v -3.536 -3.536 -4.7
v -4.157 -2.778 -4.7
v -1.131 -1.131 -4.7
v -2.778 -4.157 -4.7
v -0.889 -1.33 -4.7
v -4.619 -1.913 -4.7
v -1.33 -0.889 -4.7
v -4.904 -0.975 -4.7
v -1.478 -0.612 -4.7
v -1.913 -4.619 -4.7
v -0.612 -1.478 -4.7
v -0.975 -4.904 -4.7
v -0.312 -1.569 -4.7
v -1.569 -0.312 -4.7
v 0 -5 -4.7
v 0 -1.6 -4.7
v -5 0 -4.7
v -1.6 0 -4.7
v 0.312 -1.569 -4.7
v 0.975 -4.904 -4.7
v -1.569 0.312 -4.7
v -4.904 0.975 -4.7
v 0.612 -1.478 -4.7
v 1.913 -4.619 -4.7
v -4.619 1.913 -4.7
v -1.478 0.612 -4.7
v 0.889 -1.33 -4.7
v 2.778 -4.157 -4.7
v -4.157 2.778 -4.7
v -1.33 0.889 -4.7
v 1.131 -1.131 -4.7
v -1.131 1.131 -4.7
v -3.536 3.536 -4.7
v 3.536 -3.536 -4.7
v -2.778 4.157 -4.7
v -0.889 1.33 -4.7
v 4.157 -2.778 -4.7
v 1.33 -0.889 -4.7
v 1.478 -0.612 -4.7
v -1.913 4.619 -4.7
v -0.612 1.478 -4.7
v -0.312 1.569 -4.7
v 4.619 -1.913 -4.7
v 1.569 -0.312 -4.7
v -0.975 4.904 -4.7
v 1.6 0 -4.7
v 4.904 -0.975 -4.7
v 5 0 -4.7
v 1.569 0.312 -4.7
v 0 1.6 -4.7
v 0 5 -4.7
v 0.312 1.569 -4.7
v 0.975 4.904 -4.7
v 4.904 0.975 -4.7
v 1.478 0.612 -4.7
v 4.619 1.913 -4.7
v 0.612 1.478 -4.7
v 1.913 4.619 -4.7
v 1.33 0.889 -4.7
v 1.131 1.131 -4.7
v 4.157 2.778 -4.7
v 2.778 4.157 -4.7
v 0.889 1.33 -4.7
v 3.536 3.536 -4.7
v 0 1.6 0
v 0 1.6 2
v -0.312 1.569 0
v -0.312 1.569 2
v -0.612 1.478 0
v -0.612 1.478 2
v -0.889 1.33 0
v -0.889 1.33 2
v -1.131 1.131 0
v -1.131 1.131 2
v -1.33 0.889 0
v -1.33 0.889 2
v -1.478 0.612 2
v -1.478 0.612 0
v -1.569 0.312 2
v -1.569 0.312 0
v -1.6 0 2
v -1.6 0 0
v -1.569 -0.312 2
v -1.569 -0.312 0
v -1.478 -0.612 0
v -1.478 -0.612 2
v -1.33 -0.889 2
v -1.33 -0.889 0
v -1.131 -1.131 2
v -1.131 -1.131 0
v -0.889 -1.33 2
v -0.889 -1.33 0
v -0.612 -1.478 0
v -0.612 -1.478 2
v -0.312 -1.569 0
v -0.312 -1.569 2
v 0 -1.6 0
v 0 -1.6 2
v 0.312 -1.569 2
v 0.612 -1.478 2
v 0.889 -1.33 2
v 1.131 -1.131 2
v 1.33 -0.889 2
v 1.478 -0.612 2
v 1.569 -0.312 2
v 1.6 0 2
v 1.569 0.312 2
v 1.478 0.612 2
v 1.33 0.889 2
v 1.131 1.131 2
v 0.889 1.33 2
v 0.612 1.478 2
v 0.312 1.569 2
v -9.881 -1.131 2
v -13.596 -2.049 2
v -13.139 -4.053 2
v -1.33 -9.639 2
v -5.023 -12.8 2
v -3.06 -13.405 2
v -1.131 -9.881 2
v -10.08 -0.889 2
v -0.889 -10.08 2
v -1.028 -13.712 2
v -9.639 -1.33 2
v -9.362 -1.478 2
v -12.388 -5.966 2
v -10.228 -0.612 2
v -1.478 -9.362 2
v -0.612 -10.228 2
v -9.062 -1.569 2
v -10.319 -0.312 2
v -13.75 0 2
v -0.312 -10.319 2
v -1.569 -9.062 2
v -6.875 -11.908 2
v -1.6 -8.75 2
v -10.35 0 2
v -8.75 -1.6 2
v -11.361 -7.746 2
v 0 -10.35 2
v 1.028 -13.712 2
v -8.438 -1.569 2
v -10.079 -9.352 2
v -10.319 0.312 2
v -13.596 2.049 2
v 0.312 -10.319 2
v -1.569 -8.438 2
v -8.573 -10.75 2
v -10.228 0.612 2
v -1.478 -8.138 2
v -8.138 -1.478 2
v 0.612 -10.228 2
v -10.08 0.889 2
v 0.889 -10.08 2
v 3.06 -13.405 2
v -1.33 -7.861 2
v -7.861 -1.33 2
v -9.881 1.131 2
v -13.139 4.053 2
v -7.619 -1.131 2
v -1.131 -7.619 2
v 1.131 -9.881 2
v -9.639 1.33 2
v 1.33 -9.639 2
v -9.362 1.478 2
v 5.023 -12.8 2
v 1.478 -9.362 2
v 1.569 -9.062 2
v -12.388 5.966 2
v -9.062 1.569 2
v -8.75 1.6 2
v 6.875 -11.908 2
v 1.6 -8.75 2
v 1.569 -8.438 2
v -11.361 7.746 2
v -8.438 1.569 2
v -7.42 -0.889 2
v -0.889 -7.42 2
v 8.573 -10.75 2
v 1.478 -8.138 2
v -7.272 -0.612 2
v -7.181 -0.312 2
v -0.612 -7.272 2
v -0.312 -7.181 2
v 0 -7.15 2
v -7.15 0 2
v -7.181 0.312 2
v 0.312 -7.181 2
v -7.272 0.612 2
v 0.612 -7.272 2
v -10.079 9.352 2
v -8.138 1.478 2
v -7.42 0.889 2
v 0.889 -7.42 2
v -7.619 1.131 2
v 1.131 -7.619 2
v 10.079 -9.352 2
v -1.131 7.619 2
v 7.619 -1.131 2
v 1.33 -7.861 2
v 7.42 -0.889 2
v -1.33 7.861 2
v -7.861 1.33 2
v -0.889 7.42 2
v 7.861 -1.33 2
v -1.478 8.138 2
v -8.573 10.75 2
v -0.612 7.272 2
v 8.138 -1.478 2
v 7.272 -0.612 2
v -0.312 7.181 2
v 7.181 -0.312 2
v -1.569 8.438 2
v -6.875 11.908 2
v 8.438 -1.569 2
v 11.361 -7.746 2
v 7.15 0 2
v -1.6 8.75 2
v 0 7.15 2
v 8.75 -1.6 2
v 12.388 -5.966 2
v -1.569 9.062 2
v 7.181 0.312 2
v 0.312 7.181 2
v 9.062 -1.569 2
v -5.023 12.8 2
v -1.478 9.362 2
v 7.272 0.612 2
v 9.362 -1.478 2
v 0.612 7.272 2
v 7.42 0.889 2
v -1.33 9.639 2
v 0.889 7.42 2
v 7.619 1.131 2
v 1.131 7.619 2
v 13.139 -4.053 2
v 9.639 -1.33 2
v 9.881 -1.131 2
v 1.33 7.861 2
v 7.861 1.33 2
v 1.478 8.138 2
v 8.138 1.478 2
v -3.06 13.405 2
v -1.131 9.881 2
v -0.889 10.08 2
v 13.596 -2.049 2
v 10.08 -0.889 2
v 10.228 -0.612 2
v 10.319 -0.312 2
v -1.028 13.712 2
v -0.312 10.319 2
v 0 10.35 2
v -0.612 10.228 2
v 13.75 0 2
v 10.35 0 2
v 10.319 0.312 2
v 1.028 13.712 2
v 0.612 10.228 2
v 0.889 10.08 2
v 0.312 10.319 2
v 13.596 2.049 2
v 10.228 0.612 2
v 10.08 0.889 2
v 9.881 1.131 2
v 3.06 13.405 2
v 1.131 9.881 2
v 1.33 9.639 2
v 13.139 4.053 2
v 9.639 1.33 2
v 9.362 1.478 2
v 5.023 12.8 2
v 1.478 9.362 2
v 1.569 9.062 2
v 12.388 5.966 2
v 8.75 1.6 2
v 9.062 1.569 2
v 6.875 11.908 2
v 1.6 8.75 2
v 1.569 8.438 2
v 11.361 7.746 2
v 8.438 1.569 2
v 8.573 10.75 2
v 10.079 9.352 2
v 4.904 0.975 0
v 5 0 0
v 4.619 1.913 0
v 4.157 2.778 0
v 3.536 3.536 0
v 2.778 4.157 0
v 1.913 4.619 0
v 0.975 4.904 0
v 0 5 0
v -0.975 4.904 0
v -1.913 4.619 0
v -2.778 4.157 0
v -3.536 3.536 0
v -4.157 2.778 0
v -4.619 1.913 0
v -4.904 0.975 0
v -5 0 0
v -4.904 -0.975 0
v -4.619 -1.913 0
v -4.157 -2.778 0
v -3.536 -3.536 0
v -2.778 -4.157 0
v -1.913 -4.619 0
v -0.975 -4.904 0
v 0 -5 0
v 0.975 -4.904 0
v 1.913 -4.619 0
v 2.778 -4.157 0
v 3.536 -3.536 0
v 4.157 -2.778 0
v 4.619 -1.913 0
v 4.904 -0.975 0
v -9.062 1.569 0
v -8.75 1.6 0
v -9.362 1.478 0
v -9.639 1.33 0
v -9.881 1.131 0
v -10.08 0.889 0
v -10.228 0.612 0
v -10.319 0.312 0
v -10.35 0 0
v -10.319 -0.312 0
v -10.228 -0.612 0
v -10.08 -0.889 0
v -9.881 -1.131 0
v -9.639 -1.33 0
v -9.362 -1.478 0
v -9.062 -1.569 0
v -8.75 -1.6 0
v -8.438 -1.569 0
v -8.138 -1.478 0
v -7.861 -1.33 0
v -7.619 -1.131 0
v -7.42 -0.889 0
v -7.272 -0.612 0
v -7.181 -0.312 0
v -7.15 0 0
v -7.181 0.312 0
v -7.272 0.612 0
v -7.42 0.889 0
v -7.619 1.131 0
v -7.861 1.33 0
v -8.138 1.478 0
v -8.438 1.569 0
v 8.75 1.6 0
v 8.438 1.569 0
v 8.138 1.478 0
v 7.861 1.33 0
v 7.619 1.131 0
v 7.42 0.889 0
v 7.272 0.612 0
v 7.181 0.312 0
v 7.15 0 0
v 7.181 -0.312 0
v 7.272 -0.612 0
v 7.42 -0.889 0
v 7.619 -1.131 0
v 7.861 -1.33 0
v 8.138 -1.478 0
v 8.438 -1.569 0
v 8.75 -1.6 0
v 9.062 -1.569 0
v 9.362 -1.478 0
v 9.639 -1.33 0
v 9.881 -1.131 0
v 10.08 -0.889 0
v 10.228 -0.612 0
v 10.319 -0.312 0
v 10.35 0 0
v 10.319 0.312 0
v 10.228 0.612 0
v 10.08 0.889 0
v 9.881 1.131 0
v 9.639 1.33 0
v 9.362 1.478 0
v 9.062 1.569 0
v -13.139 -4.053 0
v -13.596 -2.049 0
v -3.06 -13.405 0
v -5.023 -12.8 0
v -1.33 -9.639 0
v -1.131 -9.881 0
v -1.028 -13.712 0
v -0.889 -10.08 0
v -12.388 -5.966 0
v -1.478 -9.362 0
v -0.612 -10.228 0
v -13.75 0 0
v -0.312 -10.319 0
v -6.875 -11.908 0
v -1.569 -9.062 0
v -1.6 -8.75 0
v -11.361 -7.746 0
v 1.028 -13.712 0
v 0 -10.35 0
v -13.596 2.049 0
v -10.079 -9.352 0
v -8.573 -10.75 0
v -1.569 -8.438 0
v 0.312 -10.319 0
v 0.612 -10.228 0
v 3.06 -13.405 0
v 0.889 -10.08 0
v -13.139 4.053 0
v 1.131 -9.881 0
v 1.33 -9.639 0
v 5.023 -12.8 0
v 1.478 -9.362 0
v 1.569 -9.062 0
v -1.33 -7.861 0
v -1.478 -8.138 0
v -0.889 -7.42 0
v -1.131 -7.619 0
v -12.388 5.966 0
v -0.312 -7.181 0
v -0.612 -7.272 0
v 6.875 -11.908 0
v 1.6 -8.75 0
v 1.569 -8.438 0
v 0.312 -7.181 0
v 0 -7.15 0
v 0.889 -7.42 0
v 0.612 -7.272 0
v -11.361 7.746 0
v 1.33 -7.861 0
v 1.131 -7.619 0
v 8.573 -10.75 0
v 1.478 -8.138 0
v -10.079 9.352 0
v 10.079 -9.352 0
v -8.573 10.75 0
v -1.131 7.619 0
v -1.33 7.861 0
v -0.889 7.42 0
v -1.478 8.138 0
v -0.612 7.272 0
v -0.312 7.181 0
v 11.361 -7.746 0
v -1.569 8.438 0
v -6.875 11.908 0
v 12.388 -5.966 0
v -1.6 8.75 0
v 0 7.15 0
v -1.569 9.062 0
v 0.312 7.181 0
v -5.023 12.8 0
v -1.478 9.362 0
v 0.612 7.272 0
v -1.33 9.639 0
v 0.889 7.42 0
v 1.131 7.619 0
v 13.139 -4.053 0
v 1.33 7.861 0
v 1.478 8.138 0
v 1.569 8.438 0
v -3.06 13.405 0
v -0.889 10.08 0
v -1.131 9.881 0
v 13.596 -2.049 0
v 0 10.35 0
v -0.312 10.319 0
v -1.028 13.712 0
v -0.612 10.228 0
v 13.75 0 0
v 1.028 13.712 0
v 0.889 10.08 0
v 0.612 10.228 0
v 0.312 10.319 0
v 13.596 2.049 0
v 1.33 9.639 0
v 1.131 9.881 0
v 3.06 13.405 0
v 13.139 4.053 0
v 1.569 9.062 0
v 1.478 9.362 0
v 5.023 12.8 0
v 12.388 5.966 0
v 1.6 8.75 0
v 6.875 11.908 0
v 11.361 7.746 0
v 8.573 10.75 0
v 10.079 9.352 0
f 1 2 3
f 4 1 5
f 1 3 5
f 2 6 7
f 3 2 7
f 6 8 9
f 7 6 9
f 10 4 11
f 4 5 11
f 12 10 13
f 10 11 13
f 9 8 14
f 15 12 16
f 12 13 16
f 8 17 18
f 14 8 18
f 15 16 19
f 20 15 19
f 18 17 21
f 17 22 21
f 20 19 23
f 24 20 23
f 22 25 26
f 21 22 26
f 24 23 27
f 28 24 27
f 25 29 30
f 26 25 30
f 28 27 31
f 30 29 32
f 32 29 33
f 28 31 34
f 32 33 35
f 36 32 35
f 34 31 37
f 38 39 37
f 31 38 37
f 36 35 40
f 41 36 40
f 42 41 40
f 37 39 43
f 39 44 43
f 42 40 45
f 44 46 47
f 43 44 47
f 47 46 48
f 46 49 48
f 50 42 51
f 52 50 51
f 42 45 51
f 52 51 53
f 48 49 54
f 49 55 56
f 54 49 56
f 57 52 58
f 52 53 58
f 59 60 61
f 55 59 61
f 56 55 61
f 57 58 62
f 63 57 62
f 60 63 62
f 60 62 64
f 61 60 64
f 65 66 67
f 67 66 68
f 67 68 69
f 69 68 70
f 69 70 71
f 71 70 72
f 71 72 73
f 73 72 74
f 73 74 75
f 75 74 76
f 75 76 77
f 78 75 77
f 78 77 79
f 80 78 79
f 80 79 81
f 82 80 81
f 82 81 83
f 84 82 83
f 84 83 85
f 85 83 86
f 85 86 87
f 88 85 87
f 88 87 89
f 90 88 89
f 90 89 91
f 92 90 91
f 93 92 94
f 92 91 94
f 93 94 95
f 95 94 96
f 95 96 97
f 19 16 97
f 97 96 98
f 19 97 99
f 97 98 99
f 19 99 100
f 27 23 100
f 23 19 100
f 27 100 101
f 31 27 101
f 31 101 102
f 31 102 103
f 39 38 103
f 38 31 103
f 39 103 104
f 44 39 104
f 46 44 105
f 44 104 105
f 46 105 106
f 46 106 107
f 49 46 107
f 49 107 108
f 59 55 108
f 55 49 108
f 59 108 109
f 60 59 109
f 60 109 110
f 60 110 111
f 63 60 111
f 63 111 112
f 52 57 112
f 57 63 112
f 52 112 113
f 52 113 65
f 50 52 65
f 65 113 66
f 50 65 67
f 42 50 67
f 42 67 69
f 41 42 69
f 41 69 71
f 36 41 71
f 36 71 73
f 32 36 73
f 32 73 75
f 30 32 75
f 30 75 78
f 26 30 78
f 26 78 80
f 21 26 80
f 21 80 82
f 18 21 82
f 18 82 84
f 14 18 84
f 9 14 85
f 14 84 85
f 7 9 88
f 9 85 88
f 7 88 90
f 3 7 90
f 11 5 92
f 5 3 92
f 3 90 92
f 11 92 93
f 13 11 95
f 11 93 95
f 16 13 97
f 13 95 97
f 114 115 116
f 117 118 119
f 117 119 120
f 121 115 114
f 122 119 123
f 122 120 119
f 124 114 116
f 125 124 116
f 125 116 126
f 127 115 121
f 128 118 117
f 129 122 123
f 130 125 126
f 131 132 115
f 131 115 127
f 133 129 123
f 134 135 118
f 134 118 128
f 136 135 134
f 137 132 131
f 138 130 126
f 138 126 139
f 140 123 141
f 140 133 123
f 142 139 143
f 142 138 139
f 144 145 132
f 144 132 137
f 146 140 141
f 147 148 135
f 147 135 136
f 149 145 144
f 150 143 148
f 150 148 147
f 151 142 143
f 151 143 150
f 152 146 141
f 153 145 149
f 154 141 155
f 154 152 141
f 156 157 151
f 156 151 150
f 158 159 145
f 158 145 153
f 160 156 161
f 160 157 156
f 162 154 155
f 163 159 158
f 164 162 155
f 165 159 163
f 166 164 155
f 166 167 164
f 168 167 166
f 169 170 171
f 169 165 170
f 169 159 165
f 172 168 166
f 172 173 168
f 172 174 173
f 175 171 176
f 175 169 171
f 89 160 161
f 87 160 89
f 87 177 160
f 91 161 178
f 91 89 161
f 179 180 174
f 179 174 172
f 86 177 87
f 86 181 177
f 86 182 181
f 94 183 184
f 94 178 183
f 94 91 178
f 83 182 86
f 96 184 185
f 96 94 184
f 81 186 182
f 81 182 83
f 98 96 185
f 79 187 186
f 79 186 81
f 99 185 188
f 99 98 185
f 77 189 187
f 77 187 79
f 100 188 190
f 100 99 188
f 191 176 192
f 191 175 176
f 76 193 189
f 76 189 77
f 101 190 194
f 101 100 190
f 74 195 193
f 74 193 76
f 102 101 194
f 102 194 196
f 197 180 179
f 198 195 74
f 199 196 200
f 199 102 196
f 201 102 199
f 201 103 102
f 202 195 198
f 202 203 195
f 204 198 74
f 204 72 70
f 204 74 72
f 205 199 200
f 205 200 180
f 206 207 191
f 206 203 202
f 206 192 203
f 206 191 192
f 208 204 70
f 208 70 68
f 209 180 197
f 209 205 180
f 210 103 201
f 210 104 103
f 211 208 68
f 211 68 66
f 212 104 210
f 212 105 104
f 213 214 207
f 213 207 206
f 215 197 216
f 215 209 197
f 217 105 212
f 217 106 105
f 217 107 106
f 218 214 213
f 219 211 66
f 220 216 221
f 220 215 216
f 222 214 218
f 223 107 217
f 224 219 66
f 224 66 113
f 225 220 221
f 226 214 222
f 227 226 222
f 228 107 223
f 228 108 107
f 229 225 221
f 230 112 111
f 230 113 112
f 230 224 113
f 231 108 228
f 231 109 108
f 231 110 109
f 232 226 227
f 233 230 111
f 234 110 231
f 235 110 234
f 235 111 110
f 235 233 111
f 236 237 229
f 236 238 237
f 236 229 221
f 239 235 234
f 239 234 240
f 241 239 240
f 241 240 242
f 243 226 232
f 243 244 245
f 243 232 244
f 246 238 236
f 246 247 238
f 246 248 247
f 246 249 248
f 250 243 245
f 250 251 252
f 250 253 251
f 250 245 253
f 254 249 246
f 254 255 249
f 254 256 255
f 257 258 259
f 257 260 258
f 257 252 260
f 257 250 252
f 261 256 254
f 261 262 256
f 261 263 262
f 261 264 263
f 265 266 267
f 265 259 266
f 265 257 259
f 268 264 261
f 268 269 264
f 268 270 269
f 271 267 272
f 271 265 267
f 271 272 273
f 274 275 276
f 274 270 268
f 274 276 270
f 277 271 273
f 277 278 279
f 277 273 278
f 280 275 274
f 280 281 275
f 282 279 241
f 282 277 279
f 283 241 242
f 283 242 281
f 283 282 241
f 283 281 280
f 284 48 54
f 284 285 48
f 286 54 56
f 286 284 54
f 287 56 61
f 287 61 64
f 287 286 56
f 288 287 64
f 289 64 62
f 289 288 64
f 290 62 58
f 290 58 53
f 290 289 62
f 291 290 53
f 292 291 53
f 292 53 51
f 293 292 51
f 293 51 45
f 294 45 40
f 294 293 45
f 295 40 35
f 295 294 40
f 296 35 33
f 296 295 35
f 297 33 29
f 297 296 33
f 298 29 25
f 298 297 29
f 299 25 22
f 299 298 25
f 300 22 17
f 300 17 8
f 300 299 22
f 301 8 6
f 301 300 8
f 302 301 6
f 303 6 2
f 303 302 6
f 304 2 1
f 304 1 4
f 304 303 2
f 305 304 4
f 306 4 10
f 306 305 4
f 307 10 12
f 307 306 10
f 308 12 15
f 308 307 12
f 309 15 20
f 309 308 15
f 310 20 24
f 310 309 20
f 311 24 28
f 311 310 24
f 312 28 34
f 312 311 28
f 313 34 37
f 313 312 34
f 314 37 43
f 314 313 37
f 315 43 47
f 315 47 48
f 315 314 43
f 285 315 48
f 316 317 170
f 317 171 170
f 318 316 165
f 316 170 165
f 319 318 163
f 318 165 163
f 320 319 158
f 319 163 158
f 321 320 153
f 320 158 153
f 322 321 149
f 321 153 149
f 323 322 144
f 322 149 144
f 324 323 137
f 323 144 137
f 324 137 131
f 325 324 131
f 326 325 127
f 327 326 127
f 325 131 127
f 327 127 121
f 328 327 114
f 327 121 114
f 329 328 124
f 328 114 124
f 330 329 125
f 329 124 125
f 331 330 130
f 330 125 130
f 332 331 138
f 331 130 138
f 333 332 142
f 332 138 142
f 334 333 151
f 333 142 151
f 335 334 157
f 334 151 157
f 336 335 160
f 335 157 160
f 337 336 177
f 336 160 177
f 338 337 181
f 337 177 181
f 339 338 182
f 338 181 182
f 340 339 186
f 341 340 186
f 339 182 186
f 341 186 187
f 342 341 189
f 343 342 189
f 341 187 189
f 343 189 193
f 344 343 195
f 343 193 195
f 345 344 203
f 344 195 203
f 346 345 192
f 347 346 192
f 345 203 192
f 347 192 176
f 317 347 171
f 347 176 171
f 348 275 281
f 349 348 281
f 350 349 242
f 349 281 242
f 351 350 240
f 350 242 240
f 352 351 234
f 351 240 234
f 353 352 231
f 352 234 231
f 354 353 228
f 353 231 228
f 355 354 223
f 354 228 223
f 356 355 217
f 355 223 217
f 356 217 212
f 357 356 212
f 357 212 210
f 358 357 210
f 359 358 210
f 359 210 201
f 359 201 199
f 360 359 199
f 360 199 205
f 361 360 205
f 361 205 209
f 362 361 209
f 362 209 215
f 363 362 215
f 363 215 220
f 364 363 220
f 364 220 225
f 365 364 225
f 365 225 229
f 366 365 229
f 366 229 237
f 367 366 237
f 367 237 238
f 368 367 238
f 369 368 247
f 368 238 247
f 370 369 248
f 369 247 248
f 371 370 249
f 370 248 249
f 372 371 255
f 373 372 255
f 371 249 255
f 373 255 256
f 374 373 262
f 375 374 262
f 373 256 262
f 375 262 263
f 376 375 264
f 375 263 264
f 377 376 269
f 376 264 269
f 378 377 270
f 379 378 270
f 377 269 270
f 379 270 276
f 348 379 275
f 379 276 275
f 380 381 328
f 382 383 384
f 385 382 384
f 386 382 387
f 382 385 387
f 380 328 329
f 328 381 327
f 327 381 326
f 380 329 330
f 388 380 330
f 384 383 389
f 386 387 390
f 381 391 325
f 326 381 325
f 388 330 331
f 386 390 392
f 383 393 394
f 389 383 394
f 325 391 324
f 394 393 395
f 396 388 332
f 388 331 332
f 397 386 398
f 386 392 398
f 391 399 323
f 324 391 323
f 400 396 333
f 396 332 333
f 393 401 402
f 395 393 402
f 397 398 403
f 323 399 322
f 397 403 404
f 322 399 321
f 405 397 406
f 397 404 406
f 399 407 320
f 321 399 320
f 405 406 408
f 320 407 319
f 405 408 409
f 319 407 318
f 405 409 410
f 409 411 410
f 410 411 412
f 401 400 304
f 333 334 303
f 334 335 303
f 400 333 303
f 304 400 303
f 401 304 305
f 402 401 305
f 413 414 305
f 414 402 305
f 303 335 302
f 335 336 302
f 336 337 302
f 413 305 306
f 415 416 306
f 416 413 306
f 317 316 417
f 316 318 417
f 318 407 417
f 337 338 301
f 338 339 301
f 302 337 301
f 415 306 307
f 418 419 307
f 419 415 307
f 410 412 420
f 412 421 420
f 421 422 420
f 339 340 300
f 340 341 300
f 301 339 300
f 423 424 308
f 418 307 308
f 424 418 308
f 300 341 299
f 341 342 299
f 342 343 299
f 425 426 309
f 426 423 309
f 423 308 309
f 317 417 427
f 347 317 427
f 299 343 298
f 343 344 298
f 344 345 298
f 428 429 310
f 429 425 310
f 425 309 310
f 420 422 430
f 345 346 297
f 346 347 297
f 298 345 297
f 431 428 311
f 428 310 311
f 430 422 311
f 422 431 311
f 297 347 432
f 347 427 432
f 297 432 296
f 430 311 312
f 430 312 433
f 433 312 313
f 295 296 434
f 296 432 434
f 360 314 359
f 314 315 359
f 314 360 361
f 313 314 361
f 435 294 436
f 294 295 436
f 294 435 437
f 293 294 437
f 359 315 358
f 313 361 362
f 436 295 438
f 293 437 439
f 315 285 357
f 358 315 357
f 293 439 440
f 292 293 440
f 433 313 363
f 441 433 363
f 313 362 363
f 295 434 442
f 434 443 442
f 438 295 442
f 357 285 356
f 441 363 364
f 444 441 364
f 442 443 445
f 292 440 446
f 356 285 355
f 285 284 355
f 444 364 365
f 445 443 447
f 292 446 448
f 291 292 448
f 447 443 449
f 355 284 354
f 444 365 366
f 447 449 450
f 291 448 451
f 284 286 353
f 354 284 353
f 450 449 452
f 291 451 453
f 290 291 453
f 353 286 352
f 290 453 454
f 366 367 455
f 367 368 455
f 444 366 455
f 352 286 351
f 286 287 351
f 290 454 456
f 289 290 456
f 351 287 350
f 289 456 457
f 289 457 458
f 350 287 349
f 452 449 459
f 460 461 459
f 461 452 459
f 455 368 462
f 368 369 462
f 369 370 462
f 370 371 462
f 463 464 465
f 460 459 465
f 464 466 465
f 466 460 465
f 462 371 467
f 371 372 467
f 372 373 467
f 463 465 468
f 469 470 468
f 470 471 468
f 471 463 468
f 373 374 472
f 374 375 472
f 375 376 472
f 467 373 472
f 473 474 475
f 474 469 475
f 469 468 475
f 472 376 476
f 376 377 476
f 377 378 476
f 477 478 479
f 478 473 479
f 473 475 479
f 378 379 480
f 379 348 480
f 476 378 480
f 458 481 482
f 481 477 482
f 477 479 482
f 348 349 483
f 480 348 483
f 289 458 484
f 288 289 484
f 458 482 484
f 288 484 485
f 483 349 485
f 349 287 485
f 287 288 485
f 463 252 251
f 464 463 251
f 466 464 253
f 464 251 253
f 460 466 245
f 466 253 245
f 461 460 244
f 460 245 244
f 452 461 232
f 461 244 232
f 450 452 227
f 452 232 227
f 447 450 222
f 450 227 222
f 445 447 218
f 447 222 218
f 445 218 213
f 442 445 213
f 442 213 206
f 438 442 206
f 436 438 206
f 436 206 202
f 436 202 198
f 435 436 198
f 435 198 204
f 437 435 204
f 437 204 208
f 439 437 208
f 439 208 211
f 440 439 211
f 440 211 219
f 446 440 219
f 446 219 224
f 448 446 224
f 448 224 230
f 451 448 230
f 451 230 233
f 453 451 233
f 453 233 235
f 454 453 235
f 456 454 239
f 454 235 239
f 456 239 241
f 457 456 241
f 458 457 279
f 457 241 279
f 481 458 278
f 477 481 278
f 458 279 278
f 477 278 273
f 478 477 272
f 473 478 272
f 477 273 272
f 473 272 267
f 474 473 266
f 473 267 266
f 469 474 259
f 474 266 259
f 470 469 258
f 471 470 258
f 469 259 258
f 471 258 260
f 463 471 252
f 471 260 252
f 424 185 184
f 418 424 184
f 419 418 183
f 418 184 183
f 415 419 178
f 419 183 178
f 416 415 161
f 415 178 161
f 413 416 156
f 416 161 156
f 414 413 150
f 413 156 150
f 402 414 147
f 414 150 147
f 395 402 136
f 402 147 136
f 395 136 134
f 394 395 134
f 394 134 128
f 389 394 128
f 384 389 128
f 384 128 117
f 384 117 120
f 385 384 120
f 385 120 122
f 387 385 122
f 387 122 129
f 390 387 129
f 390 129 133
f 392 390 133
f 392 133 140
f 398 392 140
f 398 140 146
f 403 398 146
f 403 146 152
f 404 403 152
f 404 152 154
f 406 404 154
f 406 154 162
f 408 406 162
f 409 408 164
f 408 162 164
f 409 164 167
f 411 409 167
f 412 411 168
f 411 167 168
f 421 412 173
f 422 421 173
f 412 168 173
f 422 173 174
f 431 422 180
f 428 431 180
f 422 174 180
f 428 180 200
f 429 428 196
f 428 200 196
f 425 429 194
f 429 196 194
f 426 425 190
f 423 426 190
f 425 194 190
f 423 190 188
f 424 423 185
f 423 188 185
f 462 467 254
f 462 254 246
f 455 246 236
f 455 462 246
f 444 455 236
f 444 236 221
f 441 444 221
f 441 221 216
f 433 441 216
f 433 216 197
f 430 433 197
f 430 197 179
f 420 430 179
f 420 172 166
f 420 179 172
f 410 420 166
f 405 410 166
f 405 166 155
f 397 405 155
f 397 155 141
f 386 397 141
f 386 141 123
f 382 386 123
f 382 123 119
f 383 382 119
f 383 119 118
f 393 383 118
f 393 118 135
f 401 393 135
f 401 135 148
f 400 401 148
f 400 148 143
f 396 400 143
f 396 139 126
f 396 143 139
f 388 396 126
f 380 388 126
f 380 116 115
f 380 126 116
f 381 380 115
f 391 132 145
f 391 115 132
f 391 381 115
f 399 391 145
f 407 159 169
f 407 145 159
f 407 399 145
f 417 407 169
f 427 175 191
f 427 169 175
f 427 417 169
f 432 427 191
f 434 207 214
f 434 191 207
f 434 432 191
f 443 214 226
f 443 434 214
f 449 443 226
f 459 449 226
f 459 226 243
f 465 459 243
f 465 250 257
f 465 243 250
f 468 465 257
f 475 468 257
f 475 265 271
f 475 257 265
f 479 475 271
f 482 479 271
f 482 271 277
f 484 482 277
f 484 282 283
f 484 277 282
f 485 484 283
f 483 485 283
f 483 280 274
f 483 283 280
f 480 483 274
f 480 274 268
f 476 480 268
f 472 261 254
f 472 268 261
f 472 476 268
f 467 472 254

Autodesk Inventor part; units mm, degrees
ref_plane "YZ Plane" through (0, 0, 0) normal (1, 0, 0) x (0, 1, 0)
ref_plane "XZ Plane" through (0, 0, 0) normal (0, 1, 0) x (-1, 0, 0)
ref_plane "XY Plane" through (0, 0, 0) normal (0, 0, 1) x (1, 0, 0)
sketch "スケッチ1" plane through (0, 0, 0) normal (0, 0, 1) x (1, 0, 0)
  circle A0 centre (0, 0) radius 13.75
  line L0 (0, 13.75) -> (0, -13.75) construction
  line L1 (13.75, 0) -> (-13.75, 0) construction
  circle A1 centre (0, 0) radius 5
  point P0 (0, 8.75)
  point P1 (0, -8.75)
  point P2 (8.75, 0)
  point P3 (-8.75, 0)
  dimension "d0" = 27.5
  dimension "d1" = 17.5
  dimension "d2" = 17.5
  dimension "d3" = 10
extrude "押し出し1" add sketch "スケッチ1" along normal blind 2 contours A0 | A1
extrude "押し出し2" add sketch "スケッチ1" against normal blind 4.7 contours A1
hole "穴1" at (0, 0, 0) at (0, 8.75, 0) at (0, -8.75, 0) at (8.75, 0, 0) at (-8.75, 0, 0) direction (0, 0, -1) diameter 3.2 depth 8 tip angle 118
hole "穴2" at (-8.75, 0, 0) at (0, 8.75, 0) at (8.75, 0, 0) at (0, -8.75, 0) at (0, 0, 0) direction (0, 0, 1) diameter 3.2 depth 8 tip angle 118
sketch "スケッチ3" plane through (0, 0, 2) normal (0, 0, 1) x (1, 0, 0)
  circle A0 centre (0, -8.75) radius 1.6 projected
  circle A1 centre (0, 8.75) radius 1.6 projected
  circle A2 centre (-8.75, 0) radius 1.6 projected
  circle A3 centre (8.75, 0) radius 1.6 projected
  circle A4 centre (0, 0) radius 1.6 projected
  circle A5 centre (0, 0) radius 13.75 projected
equation "\"d2\" = d1"
properties part number "servo horn wide"
